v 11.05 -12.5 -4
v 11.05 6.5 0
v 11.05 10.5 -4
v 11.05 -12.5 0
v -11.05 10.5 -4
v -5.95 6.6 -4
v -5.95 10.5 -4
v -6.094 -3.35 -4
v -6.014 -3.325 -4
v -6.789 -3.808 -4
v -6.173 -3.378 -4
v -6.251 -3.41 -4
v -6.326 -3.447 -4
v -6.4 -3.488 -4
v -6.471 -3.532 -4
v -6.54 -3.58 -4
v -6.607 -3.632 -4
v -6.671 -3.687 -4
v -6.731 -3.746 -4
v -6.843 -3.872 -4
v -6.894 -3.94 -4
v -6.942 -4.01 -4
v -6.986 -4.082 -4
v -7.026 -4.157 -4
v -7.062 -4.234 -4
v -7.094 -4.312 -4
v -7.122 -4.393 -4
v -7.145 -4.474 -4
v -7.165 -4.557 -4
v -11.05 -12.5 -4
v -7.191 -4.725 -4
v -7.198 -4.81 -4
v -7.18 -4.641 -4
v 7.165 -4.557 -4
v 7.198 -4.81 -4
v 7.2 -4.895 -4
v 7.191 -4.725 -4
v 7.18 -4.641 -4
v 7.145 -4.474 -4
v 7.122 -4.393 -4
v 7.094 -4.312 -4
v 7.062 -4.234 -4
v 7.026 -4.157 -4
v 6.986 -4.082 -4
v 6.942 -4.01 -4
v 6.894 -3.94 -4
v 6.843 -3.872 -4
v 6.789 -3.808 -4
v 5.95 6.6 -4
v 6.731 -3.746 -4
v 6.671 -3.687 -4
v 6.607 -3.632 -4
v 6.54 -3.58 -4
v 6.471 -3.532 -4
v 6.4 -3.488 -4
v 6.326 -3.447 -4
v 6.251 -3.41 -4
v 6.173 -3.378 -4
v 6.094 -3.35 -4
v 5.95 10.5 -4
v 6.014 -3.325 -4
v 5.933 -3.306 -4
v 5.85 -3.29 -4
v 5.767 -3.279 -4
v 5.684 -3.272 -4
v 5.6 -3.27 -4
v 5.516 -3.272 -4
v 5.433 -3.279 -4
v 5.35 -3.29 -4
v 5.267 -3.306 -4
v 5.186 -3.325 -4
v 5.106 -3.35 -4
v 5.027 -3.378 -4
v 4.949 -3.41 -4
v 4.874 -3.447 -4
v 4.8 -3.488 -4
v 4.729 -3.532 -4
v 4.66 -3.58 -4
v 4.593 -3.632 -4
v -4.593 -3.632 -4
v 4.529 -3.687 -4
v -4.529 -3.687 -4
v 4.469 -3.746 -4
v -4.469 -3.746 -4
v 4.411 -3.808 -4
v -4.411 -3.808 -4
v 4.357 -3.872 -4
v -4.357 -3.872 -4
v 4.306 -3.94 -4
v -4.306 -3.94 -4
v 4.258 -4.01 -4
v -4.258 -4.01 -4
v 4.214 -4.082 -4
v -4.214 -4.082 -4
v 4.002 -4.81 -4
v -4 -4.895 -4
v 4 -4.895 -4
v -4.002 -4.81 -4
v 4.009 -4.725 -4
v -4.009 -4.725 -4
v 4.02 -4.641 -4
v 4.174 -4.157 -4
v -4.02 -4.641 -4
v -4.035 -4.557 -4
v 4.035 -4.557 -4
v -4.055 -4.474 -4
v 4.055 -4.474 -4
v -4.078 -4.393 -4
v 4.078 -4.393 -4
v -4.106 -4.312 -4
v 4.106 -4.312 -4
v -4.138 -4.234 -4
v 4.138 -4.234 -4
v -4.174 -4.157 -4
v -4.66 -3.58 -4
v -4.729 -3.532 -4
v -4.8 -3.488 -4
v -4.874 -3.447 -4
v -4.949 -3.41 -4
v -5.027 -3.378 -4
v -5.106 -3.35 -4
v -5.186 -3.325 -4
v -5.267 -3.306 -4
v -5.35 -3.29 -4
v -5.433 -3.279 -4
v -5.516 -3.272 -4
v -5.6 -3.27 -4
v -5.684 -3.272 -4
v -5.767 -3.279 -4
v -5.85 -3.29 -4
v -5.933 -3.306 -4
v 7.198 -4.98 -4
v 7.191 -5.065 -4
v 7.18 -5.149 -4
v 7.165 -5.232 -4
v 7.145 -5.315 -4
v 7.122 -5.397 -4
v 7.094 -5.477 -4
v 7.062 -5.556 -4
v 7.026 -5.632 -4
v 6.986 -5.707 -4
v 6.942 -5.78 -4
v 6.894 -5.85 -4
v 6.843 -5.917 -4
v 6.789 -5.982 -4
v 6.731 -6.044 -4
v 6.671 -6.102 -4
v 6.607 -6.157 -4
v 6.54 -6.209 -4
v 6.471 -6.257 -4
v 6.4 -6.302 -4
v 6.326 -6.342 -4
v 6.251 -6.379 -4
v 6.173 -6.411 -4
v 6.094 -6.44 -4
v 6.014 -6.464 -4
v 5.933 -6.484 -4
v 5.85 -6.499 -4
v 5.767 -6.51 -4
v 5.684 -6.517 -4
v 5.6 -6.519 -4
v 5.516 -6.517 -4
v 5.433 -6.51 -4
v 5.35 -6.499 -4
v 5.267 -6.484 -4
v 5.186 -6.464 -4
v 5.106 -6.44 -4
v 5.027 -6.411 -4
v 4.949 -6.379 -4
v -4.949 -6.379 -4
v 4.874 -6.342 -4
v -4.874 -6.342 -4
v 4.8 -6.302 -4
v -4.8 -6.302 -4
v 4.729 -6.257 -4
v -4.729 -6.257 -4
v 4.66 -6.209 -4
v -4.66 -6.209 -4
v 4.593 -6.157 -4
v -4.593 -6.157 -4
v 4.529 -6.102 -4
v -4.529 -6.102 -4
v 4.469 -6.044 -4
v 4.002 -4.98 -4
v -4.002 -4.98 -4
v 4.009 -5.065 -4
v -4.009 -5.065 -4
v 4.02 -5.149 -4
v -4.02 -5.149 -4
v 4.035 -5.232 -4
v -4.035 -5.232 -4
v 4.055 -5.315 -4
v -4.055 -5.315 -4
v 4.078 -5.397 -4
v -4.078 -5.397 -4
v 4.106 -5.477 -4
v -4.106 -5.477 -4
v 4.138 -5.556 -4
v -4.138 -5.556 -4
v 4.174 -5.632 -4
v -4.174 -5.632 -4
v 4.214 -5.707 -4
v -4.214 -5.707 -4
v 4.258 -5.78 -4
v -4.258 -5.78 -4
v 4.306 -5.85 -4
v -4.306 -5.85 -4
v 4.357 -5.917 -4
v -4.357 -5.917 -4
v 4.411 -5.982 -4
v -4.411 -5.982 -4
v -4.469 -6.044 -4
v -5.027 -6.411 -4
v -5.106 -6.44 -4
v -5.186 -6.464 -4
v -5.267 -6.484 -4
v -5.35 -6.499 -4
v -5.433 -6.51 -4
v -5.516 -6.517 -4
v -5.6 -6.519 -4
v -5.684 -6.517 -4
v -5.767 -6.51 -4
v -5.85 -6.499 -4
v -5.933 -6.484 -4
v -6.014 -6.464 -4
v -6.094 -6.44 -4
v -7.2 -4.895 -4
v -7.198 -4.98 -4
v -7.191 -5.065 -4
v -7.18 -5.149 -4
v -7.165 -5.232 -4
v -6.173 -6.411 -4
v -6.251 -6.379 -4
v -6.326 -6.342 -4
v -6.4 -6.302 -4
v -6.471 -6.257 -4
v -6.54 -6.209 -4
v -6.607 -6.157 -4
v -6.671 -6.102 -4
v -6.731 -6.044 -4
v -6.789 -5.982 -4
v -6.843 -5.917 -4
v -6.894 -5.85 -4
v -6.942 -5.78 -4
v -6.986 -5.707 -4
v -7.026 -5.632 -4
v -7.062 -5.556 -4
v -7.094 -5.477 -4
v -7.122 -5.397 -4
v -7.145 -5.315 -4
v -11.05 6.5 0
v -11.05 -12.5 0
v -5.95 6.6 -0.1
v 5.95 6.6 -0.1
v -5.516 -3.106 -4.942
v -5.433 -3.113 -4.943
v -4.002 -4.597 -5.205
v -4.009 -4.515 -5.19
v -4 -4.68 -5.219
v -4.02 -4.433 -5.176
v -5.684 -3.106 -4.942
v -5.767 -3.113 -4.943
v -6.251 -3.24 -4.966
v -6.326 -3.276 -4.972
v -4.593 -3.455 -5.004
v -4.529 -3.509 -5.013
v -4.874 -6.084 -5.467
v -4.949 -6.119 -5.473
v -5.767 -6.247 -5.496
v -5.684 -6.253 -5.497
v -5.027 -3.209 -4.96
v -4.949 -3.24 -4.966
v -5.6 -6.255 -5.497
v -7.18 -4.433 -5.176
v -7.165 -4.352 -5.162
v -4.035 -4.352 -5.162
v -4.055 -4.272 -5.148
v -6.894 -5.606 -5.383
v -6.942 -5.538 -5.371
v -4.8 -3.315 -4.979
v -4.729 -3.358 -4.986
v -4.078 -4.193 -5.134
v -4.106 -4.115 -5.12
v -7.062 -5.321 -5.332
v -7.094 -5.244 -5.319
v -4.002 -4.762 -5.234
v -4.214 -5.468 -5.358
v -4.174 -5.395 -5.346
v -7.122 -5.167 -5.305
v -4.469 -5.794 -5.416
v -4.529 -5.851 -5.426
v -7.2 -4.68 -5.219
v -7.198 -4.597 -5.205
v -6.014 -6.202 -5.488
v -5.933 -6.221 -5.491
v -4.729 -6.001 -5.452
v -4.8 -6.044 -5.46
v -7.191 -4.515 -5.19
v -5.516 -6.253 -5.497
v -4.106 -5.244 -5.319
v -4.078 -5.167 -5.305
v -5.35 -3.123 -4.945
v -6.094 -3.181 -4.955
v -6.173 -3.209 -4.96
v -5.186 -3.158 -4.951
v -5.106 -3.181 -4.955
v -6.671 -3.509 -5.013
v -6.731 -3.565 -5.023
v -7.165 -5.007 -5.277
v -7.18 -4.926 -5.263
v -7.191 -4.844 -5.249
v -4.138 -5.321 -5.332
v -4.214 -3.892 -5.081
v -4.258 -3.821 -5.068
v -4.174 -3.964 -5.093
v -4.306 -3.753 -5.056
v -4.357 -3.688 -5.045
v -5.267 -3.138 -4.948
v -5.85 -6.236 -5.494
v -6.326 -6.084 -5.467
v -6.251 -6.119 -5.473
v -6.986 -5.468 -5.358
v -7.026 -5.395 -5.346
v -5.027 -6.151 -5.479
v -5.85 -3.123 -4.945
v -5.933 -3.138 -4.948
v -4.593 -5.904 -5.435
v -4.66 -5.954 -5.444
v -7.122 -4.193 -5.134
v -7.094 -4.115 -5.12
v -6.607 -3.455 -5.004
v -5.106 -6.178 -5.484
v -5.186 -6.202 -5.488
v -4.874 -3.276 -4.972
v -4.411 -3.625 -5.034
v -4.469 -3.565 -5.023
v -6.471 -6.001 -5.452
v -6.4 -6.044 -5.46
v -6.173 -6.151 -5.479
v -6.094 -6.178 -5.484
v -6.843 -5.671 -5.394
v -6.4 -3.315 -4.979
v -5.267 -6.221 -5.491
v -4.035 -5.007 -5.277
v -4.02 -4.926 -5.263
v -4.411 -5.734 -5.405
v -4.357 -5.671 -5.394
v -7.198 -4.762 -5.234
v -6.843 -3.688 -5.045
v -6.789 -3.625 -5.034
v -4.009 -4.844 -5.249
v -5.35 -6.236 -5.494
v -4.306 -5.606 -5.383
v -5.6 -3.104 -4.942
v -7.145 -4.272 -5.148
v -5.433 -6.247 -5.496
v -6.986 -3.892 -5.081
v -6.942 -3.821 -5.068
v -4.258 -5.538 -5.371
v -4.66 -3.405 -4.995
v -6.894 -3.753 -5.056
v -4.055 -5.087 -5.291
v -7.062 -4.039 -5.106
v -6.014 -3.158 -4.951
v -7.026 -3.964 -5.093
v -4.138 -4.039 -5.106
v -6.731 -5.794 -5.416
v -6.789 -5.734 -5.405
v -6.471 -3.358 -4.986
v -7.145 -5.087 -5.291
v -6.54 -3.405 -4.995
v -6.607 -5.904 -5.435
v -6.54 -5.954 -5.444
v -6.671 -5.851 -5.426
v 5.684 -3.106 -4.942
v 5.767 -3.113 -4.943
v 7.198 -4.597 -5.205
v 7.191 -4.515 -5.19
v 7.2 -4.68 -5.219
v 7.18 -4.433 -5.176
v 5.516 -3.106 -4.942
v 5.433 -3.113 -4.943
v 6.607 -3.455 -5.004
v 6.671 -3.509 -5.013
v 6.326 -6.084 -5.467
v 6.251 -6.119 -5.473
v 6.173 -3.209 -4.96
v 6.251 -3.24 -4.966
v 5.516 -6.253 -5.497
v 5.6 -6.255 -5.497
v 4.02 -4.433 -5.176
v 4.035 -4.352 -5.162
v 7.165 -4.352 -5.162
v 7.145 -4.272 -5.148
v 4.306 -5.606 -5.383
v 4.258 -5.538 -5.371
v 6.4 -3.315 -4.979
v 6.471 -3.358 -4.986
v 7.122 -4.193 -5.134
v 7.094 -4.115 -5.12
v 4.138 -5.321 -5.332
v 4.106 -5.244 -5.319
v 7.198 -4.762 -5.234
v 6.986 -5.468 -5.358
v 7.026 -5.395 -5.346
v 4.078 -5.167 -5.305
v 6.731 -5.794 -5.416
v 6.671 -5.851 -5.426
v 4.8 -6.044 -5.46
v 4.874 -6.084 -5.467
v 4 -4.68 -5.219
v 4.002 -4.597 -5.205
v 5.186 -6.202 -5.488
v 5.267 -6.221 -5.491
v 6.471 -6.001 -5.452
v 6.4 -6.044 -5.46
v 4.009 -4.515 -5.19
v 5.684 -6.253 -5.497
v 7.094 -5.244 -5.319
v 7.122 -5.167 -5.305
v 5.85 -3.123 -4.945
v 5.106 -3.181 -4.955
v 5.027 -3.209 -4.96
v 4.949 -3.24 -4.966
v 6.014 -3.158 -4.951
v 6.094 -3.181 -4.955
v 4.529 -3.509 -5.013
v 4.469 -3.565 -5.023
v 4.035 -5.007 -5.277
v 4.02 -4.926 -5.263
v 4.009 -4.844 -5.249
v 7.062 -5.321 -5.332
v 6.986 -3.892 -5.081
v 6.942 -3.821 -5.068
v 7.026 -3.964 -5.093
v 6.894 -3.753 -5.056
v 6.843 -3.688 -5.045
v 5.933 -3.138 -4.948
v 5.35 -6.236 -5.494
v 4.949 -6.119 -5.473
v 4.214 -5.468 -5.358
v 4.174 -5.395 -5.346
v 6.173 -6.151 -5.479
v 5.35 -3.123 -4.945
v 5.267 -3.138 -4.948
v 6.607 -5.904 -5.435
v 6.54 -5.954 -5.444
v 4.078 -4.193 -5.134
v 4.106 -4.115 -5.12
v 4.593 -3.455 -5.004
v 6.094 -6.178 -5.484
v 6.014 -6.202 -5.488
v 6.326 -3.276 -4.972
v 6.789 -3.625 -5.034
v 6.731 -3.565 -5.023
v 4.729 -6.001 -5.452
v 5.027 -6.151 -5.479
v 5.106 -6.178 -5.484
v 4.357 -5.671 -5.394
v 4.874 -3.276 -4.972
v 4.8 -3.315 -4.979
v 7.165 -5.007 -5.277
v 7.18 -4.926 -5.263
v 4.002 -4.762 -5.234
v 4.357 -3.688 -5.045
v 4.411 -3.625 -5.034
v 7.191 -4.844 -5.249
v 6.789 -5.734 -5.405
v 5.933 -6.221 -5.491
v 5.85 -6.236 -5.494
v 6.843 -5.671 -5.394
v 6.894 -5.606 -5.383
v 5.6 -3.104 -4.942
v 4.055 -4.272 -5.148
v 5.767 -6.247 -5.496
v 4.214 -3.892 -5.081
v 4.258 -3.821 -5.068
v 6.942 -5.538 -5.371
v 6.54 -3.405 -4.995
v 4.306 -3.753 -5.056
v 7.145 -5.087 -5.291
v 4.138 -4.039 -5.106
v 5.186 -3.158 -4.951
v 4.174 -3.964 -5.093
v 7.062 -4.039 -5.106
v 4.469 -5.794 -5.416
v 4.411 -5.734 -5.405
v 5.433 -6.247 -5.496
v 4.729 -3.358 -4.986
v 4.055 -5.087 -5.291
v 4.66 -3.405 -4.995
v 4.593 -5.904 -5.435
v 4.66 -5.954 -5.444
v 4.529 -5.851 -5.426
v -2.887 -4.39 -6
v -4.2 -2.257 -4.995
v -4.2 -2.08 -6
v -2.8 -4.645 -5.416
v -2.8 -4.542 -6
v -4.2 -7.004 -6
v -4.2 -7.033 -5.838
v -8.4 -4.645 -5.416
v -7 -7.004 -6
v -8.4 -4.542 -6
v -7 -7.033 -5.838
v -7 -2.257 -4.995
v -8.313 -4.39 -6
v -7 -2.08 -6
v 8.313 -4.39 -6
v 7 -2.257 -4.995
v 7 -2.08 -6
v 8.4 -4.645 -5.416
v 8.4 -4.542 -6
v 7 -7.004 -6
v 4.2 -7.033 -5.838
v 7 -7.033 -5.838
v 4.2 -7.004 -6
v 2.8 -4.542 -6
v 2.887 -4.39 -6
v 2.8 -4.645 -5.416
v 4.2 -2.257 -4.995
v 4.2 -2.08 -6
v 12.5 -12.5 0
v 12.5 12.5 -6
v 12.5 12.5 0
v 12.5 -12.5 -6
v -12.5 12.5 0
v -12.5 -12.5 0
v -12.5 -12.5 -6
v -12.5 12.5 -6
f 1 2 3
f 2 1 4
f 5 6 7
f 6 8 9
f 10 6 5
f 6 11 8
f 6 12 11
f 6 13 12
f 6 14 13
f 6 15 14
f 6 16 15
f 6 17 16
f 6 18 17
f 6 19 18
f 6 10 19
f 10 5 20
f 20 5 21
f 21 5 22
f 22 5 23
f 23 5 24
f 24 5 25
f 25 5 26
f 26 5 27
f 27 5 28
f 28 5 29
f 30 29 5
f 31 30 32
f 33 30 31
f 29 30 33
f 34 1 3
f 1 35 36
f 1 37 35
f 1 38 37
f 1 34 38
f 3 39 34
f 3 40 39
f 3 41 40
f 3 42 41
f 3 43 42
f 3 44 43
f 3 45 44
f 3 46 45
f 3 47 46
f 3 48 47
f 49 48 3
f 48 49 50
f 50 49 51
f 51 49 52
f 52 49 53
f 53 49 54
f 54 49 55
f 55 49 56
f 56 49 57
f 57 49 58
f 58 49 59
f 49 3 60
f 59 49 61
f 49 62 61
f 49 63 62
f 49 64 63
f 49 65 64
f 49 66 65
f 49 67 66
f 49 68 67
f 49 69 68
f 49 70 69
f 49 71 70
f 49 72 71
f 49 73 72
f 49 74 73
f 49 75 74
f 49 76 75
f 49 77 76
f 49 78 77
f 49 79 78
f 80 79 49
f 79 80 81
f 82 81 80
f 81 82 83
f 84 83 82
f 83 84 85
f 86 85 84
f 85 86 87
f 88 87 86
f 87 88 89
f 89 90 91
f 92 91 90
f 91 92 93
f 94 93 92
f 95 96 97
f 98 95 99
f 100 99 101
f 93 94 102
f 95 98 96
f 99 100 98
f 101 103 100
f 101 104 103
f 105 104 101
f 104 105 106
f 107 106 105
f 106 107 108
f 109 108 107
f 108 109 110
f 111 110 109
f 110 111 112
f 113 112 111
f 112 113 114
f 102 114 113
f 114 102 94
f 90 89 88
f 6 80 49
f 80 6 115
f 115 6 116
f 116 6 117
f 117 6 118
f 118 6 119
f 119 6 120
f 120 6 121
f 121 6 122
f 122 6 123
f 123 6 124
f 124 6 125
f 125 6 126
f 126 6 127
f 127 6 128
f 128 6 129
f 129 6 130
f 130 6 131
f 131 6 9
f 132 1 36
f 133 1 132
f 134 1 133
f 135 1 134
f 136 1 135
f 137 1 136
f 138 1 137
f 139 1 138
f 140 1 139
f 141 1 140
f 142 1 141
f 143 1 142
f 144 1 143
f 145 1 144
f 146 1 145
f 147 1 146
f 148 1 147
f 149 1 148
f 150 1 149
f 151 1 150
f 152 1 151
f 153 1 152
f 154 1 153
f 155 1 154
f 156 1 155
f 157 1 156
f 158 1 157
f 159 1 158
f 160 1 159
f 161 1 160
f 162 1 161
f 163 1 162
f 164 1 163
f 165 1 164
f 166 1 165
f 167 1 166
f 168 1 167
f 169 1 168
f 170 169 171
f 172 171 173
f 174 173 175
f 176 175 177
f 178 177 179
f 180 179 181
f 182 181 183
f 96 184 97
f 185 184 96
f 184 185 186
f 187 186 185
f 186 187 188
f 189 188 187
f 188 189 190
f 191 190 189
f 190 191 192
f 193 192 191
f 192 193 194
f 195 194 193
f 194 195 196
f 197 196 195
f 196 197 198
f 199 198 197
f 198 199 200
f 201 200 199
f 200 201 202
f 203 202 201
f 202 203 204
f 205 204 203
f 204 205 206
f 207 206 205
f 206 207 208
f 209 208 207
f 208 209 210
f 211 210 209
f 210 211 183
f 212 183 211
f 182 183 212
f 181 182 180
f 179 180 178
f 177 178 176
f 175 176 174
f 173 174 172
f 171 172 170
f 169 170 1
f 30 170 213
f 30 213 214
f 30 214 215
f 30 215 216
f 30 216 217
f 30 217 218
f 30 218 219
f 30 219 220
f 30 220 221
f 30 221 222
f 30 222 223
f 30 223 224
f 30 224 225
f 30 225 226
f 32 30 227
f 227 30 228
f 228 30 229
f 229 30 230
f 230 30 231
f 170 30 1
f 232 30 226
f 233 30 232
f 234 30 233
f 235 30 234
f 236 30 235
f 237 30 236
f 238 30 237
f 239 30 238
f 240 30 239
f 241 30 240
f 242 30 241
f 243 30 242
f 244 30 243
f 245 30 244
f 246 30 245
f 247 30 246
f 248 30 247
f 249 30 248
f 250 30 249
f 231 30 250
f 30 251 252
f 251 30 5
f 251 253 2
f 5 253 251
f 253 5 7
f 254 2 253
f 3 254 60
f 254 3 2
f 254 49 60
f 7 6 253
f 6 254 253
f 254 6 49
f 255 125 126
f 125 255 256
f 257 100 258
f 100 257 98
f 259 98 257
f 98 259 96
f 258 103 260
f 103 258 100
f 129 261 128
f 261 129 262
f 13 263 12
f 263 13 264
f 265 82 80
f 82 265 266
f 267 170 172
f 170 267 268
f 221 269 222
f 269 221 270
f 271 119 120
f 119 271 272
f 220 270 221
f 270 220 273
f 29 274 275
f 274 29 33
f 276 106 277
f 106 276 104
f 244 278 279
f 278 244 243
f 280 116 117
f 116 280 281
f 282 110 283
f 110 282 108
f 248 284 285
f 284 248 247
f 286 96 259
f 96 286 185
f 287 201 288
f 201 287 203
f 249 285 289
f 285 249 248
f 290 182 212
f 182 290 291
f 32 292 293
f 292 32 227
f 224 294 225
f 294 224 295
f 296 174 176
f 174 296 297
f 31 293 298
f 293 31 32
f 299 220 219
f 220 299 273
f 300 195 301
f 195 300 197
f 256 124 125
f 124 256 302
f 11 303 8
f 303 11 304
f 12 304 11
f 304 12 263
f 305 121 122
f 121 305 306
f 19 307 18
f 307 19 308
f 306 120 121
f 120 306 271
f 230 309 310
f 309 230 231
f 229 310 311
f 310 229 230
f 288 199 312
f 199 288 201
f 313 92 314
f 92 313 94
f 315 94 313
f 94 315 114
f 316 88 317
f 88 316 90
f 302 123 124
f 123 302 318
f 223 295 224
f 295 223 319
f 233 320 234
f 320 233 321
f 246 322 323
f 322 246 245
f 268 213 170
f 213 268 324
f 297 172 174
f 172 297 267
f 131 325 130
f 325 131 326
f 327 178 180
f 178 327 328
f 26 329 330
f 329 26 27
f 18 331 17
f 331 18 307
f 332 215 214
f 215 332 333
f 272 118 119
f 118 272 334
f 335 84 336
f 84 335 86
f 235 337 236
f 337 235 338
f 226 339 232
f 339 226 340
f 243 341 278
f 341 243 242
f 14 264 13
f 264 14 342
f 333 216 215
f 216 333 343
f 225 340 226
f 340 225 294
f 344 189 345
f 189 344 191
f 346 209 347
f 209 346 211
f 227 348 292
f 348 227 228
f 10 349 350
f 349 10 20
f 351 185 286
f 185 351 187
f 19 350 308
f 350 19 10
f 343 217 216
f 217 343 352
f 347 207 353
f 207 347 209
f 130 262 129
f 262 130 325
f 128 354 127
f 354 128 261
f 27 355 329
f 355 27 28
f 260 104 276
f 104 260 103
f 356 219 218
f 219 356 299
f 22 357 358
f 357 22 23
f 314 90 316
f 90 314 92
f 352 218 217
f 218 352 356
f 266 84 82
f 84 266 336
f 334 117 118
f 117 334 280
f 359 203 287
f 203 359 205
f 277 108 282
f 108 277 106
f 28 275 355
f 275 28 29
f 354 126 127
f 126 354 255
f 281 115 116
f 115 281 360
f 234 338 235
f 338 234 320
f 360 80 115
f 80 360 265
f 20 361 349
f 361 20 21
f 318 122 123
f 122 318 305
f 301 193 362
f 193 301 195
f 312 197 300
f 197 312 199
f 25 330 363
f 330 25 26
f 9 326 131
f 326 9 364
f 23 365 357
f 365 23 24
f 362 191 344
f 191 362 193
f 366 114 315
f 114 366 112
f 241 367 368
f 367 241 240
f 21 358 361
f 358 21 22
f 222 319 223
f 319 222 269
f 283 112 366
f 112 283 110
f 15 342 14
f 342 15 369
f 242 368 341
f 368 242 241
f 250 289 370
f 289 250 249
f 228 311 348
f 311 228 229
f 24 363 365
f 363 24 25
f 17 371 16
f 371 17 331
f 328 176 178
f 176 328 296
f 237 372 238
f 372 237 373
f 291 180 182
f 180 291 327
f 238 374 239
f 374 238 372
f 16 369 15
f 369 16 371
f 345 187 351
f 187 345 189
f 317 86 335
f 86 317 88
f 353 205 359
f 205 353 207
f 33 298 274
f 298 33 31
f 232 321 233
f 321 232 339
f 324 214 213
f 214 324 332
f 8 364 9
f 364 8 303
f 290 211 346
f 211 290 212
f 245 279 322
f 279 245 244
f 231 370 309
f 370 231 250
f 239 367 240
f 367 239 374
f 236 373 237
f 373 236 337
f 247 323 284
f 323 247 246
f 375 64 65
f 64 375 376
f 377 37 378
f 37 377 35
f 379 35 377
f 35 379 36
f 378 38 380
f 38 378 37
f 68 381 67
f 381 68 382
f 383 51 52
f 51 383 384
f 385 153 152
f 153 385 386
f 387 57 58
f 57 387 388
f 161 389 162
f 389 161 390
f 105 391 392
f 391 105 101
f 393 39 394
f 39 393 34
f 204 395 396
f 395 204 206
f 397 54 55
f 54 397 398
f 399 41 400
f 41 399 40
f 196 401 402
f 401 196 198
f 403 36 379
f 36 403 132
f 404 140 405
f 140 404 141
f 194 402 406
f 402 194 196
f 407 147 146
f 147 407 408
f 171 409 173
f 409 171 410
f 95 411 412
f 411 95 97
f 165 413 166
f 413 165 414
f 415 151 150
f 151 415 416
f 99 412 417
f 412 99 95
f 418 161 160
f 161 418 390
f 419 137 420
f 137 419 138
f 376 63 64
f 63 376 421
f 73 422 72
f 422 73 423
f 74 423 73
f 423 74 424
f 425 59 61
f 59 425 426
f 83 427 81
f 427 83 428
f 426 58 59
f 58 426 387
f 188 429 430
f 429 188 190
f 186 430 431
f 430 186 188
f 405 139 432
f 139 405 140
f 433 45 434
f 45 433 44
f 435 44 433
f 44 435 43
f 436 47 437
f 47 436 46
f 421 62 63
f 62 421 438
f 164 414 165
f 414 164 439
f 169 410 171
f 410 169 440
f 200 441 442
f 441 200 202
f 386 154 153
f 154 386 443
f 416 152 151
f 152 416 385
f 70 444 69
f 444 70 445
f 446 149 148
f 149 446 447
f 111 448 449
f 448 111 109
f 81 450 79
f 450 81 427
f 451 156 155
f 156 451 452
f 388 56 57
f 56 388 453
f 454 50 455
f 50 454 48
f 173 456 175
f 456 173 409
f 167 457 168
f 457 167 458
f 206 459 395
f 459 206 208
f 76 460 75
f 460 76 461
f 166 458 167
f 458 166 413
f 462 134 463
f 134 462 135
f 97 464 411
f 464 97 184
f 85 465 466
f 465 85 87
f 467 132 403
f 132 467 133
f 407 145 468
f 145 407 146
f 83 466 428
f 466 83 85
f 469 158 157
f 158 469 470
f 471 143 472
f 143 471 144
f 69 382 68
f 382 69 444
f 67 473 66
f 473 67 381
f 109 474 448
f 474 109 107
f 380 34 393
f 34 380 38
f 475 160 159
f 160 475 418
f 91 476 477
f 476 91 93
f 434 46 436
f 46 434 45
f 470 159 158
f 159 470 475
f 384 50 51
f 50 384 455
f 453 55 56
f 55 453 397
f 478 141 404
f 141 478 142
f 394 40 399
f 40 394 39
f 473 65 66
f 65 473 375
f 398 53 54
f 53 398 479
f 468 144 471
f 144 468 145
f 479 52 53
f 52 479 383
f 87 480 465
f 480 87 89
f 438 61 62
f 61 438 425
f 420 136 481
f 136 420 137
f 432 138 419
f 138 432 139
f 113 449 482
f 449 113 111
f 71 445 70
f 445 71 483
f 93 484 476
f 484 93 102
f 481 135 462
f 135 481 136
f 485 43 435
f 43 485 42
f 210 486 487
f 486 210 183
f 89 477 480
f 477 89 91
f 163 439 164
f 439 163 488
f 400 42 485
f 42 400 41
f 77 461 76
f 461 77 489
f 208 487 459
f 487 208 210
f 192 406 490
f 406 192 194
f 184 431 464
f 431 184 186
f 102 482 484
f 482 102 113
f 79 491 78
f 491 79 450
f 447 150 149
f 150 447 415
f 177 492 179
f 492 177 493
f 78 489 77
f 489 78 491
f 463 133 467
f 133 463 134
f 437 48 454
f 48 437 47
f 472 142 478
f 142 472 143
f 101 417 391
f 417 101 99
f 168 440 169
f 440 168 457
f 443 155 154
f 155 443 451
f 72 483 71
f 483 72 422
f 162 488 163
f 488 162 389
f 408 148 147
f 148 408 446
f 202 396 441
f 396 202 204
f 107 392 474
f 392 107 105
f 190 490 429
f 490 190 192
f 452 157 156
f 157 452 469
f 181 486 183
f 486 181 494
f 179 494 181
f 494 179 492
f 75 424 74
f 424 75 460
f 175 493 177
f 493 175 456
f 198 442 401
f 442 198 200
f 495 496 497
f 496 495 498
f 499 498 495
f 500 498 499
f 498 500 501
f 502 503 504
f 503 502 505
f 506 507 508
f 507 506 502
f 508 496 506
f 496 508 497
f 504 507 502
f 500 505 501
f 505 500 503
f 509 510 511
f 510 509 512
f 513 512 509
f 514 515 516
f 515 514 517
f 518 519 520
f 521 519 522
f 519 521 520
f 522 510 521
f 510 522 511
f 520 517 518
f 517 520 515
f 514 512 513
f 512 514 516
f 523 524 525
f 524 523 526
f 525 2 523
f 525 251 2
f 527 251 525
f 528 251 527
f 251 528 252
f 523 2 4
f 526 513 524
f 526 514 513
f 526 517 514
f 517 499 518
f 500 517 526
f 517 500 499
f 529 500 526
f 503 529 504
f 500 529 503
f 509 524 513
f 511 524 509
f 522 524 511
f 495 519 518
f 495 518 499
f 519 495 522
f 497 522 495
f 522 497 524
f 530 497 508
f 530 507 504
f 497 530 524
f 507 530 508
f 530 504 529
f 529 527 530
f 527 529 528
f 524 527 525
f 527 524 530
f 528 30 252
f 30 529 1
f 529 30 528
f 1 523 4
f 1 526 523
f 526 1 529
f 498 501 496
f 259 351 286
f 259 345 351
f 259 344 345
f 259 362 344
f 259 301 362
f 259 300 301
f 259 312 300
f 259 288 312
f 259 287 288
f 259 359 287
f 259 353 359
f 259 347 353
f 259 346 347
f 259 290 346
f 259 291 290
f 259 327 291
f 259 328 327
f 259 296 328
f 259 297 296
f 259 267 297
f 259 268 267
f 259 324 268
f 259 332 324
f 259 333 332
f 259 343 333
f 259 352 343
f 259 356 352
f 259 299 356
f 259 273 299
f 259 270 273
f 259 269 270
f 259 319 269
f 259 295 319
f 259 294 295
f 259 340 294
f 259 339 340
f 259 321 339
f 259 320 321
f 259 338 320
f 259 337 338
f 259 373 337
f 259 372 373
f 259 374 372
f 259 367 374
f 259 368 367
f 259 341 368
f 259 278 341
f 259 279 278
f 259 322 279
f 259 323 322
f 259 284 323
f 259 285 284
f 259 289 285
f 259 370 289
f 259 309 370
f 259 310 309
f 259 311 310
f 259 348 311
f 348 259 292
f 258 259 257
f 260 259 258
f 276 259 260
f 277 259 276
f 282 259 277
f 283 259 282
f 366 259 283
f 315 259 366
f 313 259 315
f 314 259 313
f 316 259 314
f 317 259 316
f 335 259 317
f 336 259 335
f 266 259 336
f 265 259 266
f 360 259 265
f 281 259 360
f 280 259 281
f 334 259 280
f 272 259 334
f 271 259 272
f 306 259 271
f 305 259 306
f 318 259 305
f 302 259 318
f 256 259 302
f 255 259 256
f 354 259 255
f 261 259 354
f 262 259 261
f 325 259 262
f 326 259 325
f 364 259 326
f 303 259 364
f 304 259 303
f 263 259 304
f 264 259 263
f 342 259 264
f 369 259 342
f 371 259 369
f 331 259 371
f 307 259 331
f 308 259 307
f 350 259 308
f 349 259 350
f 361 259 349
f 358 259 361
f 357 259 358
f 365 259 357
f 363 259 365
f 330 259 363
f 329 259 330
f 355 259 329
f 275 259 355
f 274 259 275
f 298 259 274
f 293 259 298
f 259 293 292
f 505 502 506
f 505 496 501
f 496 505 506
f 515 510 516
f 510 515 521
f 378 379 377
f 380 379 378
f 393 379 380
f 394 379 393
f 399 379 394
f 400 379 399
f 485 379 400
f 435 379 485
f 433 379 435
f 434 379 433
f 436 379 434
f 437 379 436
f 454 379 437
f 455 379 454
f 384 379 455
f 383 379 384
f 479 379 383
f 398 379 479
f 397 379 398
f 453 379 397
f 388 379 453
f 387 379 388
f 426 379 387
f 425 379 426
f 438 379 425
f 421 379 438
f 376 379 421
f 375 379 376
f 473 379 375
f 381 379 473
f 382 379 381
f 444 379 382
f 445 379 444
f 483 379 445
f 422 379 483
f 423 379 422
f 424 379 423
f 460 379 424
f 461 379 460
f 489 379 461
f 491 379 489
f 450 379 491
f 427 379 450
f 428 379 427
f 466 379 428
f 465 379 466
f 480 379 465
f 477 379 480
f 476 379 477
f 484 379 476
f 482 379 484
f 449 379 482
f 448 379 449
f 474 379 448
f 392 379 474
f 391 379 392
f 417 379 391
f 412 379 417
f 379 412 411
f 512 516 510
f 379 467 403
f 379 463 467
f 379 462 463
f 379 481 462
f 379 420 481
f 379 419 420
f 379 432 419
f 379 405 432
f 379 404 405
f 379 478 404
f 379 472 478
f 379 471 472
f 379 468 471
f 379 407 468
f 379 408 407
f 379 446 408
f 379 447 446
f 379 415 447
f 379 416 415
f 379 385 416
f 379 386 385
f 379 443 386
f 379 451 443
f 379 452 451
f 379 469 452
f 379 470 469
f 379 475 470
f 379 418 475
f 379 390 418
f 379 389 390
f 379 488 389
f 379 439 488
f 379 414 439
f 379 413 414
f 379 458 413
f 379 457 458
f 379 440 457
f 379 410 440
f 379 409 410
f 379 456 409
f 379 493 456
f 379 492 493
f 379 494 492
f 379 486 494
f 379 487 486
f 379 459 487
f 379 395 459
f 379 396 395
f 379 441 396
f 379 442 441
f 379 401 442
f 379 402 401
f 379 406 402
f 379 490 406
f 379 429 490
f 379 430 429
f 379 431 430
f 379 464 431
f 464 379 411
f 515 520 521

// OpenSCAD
// file: TF-G2-rotor-neck.scad
bearing_outer_diameter=10.2;
Bwall=1.6;
bearing_shaft_length=20.6;
bearing_shaft_shift=2.6;
bearing_inner_diameter=7;
bearing_thickness=4;

connector_w=22;
connector_t=21;
connector_h=4;
connector_hole_w=12;

screw_angle=10;
screw_offset=5.6;
M3_screw_diameter=3.2;
M3_head_diameter=5.5;


function rotorBearingNeck_screw_offset() = screw_offset;
function rotorBearingNeck_screw_angle() = screw_angle;
function rotorBearingNeck_t()=connector_t;
function rotorBearingNeck_h()=bearing_shaft_length+bearing_shaft_shift;
function rotorBearingNeck_d()=bearing_outer_diameter+2*Bwall;

module rotorBearingNeck()
{
    difference()
    {
        union()
        {
            translate([0,0,-connector_h/2])
                cube([connector_w,connector_t,connector_h], center=true);
                
            cylinder(d=bearing_outer_diameter+2*Bwall,h=bearing_shaft_length+bearing_shaft_shift, $fn=120);
        }
        
        //ax hole
        translate([0,0,bearing_shaft_shift+bearing_thickness+0.5])
            cylinder(d=bearing_inner_diameter,h = 100, $fn = 120);
        
        //top bearing
        translate([0,0,bearing_shaft_length+bearing_shaft_shift-bearing_thickness])
            cylinder(d = bearing_outer_diameter, h = bearing_thickness + 0.005, $fn =120);
            
        //bottom bearing
        translate([0, 0, bearing_shaft_shift + bearing_thickness-100])    
            cylinder(d = bearing_outer_diameter, h = 100, $fn=120);
        
        //sešikmení
        translate([0,connector_t/2,0])
            rotate([45,0,0])
                cube([connector_w+0.1,2*connector_h/sqrt(2),2*connector_h/sqrt(2)], center=true);
                
        //dira v sešikmeni
        translate([0,connector_t-connector_h+0.05,0])
                cube([connector_hole_w,connector_t,3*connector_h], center=true);        
        
        //šroubky
        translate([0,-screw_offset])
            rotate([screw_angle,0,0])
            {
                for(i=[-1,1])
                {
                    translate([i*screw_offset,0,0])
                    {
                        cylinder(d = M3_screw_diameter, h = 100, center=true, $fn =120);
                        translate([0,0,-1])
                            cylinder(d = M3_head_diameter, h = 100, $fn =120);
                    }
                }
            }
        
    }
}

module rotorBearingNeckHousing()
{
    difference()
    {
        translate([0,-connector_h/sqrt(2),-0.25*connector_h])
            cube([connector_w+0.1,connector_t+0.1+2*connector_h/sqrt(2),1.5*connector_h], center=true);
        
        translate([0,connector_t/2,0])
            rotate([45,0,0])
                cube([connector_w+0.2,2*connector_h/sqrt(2),20*connector_h/sqrt(2)], center=true);
                
        translate([0,connector_t-connector_h+0.1,0])
                cube([connector_hole_w-0.1,connector_t,3*connector_h], center=true);        
    }
    
    translate([0,-screw_offset,0])
    rotate([screw_angle,0,0])
    {
        for(i=[-1,1])
        {
            translate([i*screw_offset,0,0])
            {
                cylinder(d = M3_screw_diameter, h = 100, center=true, $fn =120);
                translate([0,0,-1])
                    cylinder(d = M3_head_diameter, h = 100, $fn =120);
            }
        }
    }

}

//rotorBearingNeckHousing();

rotorBearingNeck();
// main file
use <TF-G2-rotor-neck.scad>


screw_offset=rotorBearingNeck_screw_offset();
screw_angle=rotorBearingNeck_screw_angle();

difference()
{
    union()
    {
        translate([0,0,-3])
            cube([25,25,6], center=true);
                
    }
    
    rotorBearingNeckHousing();
    
    /*translate([0,-10,-2+0.005])
        cube([20.1,20,4.01], center=true);*/  
        
        
    for(i=[-1,1])  
        translate([i*(screw_offset),-screw_offset,0])
            rotate([screw_angle,0,0])
                translate([0,0,-5.5-10])
                    cylinder(d=5.6,h=10, $fn=6);
}

for(i=[-1,1])  
    translate([i*(screw_offset),-screw_offset,0])
        rotate([screw_angle,0,0])
            translate([0,0,-5.5])
                cylinder(d=5.6,h=0.2, $fn=6);

                      
